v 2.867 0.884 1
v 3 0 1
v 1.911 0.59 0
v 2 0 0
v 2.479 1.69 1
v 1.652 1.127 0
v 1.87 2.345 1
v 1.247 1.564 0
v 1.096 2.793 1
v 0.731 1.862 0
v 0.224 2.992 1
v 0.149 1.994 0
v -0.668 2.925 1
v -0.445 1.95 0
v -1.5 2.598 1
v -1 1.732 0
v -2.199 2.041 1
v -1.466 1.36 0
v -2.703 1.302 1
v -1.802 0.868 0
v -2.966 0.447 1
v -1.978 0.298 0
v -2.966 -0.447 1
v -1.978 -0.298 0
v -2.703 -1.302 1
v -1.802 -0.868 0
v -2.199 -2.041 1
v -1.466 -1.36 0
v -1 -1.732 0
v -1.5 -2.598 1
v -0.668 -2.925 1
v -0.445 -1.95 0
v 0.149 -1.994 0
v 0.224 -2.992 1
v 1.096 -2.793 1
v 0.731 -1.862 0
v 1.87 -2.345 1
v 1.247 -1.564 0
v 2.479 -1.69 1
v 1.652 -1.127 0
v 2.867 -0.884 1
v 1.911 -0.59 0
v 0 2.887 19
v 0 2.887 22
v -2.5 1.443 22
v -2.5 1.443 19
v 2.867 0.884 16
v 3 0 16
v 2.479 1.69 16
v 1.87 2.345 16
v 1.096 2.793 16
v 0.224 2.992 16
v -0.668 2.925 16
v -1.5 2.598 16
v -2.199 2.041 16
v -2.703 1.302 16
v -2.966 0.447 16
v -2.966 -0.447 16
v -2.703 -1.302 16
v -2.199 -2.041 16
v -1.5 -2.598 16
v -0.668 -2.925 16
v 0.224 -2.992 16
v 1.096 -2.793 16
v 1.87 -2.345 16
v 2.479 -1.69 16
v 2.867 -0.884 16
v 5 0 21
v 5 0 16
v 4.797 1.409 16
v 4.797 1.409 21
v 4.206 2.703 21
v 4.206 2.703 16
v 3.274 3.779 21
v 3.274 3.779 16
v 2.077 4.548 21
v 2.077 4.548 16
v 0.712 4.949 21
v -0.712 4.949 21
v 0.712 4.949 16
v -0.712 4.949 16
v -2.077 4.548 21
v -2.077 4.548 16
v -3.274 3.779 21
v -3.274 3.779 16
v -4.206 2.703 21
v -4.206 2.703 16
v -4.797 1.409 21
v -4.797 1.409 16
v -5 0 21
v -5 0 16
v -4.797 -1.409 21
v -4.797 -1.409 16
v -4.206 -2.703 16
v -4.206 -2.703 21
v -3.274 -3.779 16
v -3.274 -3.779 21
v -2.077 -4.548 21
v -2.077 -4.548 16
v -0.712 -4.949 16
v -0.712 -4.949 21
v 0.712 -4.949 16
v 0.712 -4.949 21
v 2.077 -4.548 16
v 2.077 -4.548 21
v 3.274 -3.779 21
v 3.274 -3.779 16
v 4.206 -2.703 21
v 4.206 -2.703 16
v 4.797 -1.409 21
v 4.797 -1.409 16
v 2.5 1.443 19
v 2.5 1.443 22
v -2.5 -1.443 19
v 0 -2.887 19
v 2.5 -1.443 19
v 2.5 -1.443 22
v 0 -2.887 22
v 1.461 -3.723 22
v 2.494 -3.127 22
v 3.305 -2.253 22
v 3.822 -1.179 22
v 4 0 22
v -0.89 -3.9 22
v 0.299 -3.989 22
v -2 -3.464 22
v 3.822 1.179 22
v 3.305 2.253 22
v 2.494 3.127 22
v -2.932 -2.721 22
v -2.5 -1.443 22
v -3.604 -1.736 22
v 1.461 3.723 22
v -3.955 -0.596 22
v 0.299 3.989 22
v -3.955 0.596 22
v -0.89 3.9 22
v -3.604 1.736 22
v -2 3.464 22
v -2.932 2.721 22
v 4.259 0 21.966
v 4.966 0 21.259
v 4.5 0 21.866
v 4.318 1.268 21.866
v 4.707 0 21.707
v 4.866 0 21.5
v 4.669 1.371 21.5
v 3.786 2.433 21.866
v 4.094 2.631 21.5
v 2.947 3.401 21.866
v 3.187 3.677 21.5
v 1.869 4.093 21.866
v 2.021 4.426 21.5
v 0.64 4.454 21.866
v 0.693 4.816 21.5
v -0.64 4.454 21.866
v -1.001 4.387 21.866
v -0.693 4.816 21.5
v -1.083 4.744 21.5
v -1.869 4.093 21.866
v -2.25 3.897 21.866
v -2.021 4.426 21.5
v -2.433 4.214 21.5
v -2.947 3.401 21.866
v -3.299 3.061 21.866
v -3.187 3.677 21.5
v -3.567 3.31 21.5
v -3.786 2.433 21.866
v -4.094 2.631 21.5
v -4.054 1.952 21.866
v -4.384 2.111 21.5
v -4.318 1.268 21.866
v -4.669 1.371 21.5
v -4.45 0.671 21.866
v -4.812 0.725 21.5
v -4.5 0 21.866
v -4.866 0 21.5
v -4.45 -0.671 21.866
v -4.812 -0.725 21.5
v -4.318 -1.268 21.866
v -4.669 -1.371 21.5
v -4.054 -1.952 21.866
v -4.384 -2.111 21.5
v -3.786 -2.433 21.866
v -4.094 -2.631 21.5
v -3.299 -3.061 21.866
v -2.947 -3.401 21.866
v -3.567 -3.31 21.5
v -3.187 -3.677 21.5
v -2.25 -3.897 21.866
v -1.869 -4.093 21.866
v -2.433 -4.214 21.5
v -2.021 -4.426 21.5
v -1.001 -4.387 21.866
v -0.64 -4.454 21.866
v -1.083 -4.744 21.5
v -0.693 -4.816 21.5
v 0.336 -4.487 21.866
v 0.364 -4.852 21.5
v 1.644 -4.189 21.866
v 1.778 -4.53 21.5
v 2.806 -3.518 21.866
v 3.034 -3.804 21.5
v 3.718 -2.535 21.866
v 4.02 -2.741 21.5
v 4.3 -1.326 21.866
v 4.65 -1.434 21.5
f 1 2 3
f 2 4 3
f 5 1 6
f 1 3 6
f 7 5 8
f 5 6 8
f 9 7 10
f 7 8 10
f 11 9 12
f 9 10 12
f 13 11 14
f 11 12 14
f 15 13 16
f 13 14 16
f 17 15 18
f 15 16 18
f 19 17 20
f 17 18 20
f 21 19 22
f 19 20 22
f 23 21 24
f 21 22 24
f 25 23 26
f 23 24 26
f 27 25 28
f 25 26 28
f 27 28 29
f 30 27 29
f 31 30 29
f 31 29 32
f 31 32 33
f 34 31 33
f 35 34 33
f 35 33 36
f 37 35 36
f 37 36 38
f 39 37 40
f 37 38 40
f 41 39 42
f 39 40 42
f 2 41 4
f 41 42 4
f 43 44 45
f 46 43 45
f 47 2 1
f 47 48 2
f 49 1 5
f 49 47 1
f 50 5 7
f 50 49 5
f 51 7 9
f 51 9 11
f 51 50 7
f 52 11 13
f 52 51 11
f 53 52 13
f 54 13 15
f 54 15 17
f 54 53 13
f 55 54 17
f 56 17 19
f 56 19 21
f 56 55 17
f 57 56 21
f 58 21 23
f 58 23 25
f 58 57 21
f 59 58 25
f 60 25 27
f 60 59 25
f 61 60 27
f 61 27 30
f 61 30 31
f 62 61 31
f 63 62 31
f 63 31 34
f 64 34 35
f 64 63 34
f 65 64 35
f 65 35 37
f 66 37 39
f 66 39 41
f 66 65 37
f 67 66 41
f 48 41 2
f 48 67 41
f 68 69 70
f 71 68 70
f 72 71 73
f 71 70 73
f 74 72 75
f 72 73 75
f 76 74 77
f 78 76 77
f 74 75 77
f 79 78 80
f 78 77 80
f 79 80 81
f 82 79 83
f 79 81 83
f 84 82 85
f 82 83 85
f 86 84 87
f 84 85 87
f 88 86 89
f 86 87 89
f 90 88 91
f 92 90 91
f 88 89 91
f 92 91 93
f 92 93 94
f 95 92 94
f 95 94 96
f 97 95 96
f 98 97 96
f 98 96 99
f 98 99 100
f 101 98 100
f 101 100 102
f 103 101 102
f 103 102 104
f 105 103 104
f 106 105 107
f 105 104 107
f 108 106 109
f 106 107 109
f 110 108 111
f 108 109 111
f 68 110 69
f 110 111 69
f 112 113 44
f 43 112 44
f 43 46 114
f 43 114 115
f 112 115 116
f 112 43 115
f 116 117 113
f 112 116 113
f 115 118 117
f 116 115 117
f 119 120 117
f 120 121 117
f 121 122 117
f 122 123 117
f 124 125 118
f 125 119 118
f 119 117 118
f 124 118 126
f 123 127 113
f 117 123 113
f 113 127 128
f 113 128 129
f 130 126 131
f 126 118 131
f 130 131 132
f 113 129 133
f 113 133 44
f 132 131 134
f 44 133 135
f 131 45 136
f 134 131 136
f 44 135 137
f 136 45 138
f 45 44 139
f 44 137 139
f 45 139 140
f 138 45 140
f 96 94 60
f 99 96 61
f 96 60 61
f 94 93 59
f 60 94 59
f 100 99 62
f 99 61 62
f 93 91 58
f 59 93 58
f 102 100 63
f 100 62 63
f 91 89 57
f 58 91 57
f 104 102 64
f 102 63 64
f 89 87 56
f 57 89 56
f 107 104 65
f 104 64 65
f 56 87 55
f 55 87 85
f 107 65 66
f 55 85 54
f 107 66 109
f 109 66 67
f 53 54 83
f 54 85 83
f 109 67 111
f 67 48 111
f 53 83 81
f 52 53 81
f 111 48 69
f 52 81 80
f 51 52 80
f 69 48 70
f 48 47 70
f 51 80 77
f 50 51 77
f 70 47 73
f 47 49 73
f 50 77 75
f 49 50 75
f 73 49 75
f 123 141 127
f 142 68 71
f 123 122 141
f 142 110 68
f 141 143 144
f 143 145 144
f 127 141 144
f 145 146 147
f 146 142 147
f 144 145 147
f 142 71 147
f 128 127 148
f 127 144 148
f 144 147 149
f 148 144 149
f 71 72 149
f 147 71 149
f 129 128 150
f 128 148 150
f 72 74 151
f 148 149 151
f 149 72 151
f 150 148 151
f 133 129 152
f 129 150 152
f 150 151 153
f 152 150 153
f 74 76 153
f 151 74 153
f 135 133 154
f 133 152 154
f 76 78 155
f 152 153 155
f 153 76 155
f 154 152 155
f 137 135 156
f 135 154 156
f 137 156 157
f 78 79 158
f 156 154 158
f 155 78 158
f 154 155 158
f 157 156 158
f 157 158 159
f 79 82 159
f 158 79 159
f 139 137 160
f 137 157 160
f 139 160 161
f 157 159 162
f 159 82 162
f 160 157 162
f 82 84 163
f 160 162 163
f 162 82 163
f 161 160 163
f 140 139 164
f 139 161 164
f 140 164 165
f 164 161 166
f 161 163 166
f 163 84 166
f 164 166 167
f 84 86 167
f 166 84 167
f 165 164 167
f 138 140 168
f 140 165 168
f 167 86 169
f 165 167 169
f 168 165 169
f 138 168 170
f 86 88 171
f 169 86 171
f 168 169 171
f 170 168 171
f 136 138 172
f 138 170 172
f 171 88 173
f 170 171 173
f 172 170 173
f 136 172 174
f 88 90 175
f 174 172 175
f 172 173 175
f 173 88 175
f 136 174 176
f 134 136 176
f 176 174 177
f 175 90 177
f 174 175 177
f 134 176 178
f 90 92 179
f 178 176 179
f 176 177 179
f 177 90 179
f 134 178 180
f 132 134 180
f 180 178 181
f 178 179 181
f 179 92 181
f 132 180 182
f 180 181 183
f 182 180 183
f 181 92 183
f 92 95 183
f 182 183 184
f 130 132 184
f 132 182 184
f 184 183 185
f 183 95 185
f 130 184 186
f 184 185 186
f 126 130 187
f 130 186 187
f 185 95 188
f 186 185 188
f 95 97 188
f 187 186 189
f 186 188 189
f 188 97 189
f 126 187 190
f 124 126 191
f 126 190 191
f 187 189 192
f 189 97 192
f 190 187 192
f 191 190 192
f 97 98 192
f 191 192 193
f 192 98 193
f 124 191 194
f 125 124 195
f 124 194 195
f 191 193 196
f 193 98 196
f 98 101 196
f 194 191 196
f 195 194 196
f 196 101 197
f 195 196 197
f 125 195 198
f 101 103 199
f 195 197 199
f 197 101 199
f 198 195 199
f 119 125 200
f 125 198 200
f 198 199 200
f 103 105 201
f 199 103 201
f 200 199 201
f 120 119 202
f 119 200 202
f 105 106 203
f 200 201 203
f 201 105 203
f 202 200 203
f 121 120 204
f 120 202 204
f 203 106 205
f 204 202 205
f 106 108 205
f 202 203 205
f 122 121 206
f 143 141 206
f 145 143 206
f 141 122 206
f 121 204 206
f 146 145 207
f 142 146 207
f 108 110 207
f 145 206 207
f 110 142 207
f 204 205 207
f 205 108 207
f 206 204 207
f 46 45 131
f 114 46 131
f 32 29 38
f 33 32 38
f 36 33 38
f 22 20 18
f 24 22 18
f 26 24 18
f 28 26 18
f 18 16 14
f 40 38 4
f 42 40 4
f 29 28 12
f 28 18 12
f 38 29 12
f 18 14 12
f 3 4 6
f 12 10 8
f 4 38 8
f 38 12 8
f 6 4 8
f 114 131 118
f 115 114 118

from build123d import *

# Parameters (mm, degrees)
FILLET_R     = 1
POCKET_DEPTH = 3


with BuildPart() as part:
    # Sketch → Revolution (revolve)
    with BuildSketch(Plane.XZ):
        Polygon((0, 0), (0, 22), (5, 22), (5, 16), (3, 16), (3, 12), (3, 1), (2, 0), align=None)
    revolve(axis=Axis((0, 0, 0), (0, 0, 1)))

    # Fillet
    fillet_edges = [part.edges().sort_by_distance(p)[0] for p in [
        (-5, 0, 22),
    ]]
    fillet(fillet_edges, radius=FILLET_R)

    # Sketch001 (on DatumPlane) → Pocket (cut)
    with BuildSketch(Plane.XY.offset(22)):
        Polygon((2.5, 1.443376), (0, 2.886751), (-2.5, 1.443376), (-2.5, -1.443376), (0, -2.886751), (2.5, -1.443376), align=None)
    extrude(amount=-POCKET_DEPTH, mode=Mode.SUBTRACT)


solid = part.part
